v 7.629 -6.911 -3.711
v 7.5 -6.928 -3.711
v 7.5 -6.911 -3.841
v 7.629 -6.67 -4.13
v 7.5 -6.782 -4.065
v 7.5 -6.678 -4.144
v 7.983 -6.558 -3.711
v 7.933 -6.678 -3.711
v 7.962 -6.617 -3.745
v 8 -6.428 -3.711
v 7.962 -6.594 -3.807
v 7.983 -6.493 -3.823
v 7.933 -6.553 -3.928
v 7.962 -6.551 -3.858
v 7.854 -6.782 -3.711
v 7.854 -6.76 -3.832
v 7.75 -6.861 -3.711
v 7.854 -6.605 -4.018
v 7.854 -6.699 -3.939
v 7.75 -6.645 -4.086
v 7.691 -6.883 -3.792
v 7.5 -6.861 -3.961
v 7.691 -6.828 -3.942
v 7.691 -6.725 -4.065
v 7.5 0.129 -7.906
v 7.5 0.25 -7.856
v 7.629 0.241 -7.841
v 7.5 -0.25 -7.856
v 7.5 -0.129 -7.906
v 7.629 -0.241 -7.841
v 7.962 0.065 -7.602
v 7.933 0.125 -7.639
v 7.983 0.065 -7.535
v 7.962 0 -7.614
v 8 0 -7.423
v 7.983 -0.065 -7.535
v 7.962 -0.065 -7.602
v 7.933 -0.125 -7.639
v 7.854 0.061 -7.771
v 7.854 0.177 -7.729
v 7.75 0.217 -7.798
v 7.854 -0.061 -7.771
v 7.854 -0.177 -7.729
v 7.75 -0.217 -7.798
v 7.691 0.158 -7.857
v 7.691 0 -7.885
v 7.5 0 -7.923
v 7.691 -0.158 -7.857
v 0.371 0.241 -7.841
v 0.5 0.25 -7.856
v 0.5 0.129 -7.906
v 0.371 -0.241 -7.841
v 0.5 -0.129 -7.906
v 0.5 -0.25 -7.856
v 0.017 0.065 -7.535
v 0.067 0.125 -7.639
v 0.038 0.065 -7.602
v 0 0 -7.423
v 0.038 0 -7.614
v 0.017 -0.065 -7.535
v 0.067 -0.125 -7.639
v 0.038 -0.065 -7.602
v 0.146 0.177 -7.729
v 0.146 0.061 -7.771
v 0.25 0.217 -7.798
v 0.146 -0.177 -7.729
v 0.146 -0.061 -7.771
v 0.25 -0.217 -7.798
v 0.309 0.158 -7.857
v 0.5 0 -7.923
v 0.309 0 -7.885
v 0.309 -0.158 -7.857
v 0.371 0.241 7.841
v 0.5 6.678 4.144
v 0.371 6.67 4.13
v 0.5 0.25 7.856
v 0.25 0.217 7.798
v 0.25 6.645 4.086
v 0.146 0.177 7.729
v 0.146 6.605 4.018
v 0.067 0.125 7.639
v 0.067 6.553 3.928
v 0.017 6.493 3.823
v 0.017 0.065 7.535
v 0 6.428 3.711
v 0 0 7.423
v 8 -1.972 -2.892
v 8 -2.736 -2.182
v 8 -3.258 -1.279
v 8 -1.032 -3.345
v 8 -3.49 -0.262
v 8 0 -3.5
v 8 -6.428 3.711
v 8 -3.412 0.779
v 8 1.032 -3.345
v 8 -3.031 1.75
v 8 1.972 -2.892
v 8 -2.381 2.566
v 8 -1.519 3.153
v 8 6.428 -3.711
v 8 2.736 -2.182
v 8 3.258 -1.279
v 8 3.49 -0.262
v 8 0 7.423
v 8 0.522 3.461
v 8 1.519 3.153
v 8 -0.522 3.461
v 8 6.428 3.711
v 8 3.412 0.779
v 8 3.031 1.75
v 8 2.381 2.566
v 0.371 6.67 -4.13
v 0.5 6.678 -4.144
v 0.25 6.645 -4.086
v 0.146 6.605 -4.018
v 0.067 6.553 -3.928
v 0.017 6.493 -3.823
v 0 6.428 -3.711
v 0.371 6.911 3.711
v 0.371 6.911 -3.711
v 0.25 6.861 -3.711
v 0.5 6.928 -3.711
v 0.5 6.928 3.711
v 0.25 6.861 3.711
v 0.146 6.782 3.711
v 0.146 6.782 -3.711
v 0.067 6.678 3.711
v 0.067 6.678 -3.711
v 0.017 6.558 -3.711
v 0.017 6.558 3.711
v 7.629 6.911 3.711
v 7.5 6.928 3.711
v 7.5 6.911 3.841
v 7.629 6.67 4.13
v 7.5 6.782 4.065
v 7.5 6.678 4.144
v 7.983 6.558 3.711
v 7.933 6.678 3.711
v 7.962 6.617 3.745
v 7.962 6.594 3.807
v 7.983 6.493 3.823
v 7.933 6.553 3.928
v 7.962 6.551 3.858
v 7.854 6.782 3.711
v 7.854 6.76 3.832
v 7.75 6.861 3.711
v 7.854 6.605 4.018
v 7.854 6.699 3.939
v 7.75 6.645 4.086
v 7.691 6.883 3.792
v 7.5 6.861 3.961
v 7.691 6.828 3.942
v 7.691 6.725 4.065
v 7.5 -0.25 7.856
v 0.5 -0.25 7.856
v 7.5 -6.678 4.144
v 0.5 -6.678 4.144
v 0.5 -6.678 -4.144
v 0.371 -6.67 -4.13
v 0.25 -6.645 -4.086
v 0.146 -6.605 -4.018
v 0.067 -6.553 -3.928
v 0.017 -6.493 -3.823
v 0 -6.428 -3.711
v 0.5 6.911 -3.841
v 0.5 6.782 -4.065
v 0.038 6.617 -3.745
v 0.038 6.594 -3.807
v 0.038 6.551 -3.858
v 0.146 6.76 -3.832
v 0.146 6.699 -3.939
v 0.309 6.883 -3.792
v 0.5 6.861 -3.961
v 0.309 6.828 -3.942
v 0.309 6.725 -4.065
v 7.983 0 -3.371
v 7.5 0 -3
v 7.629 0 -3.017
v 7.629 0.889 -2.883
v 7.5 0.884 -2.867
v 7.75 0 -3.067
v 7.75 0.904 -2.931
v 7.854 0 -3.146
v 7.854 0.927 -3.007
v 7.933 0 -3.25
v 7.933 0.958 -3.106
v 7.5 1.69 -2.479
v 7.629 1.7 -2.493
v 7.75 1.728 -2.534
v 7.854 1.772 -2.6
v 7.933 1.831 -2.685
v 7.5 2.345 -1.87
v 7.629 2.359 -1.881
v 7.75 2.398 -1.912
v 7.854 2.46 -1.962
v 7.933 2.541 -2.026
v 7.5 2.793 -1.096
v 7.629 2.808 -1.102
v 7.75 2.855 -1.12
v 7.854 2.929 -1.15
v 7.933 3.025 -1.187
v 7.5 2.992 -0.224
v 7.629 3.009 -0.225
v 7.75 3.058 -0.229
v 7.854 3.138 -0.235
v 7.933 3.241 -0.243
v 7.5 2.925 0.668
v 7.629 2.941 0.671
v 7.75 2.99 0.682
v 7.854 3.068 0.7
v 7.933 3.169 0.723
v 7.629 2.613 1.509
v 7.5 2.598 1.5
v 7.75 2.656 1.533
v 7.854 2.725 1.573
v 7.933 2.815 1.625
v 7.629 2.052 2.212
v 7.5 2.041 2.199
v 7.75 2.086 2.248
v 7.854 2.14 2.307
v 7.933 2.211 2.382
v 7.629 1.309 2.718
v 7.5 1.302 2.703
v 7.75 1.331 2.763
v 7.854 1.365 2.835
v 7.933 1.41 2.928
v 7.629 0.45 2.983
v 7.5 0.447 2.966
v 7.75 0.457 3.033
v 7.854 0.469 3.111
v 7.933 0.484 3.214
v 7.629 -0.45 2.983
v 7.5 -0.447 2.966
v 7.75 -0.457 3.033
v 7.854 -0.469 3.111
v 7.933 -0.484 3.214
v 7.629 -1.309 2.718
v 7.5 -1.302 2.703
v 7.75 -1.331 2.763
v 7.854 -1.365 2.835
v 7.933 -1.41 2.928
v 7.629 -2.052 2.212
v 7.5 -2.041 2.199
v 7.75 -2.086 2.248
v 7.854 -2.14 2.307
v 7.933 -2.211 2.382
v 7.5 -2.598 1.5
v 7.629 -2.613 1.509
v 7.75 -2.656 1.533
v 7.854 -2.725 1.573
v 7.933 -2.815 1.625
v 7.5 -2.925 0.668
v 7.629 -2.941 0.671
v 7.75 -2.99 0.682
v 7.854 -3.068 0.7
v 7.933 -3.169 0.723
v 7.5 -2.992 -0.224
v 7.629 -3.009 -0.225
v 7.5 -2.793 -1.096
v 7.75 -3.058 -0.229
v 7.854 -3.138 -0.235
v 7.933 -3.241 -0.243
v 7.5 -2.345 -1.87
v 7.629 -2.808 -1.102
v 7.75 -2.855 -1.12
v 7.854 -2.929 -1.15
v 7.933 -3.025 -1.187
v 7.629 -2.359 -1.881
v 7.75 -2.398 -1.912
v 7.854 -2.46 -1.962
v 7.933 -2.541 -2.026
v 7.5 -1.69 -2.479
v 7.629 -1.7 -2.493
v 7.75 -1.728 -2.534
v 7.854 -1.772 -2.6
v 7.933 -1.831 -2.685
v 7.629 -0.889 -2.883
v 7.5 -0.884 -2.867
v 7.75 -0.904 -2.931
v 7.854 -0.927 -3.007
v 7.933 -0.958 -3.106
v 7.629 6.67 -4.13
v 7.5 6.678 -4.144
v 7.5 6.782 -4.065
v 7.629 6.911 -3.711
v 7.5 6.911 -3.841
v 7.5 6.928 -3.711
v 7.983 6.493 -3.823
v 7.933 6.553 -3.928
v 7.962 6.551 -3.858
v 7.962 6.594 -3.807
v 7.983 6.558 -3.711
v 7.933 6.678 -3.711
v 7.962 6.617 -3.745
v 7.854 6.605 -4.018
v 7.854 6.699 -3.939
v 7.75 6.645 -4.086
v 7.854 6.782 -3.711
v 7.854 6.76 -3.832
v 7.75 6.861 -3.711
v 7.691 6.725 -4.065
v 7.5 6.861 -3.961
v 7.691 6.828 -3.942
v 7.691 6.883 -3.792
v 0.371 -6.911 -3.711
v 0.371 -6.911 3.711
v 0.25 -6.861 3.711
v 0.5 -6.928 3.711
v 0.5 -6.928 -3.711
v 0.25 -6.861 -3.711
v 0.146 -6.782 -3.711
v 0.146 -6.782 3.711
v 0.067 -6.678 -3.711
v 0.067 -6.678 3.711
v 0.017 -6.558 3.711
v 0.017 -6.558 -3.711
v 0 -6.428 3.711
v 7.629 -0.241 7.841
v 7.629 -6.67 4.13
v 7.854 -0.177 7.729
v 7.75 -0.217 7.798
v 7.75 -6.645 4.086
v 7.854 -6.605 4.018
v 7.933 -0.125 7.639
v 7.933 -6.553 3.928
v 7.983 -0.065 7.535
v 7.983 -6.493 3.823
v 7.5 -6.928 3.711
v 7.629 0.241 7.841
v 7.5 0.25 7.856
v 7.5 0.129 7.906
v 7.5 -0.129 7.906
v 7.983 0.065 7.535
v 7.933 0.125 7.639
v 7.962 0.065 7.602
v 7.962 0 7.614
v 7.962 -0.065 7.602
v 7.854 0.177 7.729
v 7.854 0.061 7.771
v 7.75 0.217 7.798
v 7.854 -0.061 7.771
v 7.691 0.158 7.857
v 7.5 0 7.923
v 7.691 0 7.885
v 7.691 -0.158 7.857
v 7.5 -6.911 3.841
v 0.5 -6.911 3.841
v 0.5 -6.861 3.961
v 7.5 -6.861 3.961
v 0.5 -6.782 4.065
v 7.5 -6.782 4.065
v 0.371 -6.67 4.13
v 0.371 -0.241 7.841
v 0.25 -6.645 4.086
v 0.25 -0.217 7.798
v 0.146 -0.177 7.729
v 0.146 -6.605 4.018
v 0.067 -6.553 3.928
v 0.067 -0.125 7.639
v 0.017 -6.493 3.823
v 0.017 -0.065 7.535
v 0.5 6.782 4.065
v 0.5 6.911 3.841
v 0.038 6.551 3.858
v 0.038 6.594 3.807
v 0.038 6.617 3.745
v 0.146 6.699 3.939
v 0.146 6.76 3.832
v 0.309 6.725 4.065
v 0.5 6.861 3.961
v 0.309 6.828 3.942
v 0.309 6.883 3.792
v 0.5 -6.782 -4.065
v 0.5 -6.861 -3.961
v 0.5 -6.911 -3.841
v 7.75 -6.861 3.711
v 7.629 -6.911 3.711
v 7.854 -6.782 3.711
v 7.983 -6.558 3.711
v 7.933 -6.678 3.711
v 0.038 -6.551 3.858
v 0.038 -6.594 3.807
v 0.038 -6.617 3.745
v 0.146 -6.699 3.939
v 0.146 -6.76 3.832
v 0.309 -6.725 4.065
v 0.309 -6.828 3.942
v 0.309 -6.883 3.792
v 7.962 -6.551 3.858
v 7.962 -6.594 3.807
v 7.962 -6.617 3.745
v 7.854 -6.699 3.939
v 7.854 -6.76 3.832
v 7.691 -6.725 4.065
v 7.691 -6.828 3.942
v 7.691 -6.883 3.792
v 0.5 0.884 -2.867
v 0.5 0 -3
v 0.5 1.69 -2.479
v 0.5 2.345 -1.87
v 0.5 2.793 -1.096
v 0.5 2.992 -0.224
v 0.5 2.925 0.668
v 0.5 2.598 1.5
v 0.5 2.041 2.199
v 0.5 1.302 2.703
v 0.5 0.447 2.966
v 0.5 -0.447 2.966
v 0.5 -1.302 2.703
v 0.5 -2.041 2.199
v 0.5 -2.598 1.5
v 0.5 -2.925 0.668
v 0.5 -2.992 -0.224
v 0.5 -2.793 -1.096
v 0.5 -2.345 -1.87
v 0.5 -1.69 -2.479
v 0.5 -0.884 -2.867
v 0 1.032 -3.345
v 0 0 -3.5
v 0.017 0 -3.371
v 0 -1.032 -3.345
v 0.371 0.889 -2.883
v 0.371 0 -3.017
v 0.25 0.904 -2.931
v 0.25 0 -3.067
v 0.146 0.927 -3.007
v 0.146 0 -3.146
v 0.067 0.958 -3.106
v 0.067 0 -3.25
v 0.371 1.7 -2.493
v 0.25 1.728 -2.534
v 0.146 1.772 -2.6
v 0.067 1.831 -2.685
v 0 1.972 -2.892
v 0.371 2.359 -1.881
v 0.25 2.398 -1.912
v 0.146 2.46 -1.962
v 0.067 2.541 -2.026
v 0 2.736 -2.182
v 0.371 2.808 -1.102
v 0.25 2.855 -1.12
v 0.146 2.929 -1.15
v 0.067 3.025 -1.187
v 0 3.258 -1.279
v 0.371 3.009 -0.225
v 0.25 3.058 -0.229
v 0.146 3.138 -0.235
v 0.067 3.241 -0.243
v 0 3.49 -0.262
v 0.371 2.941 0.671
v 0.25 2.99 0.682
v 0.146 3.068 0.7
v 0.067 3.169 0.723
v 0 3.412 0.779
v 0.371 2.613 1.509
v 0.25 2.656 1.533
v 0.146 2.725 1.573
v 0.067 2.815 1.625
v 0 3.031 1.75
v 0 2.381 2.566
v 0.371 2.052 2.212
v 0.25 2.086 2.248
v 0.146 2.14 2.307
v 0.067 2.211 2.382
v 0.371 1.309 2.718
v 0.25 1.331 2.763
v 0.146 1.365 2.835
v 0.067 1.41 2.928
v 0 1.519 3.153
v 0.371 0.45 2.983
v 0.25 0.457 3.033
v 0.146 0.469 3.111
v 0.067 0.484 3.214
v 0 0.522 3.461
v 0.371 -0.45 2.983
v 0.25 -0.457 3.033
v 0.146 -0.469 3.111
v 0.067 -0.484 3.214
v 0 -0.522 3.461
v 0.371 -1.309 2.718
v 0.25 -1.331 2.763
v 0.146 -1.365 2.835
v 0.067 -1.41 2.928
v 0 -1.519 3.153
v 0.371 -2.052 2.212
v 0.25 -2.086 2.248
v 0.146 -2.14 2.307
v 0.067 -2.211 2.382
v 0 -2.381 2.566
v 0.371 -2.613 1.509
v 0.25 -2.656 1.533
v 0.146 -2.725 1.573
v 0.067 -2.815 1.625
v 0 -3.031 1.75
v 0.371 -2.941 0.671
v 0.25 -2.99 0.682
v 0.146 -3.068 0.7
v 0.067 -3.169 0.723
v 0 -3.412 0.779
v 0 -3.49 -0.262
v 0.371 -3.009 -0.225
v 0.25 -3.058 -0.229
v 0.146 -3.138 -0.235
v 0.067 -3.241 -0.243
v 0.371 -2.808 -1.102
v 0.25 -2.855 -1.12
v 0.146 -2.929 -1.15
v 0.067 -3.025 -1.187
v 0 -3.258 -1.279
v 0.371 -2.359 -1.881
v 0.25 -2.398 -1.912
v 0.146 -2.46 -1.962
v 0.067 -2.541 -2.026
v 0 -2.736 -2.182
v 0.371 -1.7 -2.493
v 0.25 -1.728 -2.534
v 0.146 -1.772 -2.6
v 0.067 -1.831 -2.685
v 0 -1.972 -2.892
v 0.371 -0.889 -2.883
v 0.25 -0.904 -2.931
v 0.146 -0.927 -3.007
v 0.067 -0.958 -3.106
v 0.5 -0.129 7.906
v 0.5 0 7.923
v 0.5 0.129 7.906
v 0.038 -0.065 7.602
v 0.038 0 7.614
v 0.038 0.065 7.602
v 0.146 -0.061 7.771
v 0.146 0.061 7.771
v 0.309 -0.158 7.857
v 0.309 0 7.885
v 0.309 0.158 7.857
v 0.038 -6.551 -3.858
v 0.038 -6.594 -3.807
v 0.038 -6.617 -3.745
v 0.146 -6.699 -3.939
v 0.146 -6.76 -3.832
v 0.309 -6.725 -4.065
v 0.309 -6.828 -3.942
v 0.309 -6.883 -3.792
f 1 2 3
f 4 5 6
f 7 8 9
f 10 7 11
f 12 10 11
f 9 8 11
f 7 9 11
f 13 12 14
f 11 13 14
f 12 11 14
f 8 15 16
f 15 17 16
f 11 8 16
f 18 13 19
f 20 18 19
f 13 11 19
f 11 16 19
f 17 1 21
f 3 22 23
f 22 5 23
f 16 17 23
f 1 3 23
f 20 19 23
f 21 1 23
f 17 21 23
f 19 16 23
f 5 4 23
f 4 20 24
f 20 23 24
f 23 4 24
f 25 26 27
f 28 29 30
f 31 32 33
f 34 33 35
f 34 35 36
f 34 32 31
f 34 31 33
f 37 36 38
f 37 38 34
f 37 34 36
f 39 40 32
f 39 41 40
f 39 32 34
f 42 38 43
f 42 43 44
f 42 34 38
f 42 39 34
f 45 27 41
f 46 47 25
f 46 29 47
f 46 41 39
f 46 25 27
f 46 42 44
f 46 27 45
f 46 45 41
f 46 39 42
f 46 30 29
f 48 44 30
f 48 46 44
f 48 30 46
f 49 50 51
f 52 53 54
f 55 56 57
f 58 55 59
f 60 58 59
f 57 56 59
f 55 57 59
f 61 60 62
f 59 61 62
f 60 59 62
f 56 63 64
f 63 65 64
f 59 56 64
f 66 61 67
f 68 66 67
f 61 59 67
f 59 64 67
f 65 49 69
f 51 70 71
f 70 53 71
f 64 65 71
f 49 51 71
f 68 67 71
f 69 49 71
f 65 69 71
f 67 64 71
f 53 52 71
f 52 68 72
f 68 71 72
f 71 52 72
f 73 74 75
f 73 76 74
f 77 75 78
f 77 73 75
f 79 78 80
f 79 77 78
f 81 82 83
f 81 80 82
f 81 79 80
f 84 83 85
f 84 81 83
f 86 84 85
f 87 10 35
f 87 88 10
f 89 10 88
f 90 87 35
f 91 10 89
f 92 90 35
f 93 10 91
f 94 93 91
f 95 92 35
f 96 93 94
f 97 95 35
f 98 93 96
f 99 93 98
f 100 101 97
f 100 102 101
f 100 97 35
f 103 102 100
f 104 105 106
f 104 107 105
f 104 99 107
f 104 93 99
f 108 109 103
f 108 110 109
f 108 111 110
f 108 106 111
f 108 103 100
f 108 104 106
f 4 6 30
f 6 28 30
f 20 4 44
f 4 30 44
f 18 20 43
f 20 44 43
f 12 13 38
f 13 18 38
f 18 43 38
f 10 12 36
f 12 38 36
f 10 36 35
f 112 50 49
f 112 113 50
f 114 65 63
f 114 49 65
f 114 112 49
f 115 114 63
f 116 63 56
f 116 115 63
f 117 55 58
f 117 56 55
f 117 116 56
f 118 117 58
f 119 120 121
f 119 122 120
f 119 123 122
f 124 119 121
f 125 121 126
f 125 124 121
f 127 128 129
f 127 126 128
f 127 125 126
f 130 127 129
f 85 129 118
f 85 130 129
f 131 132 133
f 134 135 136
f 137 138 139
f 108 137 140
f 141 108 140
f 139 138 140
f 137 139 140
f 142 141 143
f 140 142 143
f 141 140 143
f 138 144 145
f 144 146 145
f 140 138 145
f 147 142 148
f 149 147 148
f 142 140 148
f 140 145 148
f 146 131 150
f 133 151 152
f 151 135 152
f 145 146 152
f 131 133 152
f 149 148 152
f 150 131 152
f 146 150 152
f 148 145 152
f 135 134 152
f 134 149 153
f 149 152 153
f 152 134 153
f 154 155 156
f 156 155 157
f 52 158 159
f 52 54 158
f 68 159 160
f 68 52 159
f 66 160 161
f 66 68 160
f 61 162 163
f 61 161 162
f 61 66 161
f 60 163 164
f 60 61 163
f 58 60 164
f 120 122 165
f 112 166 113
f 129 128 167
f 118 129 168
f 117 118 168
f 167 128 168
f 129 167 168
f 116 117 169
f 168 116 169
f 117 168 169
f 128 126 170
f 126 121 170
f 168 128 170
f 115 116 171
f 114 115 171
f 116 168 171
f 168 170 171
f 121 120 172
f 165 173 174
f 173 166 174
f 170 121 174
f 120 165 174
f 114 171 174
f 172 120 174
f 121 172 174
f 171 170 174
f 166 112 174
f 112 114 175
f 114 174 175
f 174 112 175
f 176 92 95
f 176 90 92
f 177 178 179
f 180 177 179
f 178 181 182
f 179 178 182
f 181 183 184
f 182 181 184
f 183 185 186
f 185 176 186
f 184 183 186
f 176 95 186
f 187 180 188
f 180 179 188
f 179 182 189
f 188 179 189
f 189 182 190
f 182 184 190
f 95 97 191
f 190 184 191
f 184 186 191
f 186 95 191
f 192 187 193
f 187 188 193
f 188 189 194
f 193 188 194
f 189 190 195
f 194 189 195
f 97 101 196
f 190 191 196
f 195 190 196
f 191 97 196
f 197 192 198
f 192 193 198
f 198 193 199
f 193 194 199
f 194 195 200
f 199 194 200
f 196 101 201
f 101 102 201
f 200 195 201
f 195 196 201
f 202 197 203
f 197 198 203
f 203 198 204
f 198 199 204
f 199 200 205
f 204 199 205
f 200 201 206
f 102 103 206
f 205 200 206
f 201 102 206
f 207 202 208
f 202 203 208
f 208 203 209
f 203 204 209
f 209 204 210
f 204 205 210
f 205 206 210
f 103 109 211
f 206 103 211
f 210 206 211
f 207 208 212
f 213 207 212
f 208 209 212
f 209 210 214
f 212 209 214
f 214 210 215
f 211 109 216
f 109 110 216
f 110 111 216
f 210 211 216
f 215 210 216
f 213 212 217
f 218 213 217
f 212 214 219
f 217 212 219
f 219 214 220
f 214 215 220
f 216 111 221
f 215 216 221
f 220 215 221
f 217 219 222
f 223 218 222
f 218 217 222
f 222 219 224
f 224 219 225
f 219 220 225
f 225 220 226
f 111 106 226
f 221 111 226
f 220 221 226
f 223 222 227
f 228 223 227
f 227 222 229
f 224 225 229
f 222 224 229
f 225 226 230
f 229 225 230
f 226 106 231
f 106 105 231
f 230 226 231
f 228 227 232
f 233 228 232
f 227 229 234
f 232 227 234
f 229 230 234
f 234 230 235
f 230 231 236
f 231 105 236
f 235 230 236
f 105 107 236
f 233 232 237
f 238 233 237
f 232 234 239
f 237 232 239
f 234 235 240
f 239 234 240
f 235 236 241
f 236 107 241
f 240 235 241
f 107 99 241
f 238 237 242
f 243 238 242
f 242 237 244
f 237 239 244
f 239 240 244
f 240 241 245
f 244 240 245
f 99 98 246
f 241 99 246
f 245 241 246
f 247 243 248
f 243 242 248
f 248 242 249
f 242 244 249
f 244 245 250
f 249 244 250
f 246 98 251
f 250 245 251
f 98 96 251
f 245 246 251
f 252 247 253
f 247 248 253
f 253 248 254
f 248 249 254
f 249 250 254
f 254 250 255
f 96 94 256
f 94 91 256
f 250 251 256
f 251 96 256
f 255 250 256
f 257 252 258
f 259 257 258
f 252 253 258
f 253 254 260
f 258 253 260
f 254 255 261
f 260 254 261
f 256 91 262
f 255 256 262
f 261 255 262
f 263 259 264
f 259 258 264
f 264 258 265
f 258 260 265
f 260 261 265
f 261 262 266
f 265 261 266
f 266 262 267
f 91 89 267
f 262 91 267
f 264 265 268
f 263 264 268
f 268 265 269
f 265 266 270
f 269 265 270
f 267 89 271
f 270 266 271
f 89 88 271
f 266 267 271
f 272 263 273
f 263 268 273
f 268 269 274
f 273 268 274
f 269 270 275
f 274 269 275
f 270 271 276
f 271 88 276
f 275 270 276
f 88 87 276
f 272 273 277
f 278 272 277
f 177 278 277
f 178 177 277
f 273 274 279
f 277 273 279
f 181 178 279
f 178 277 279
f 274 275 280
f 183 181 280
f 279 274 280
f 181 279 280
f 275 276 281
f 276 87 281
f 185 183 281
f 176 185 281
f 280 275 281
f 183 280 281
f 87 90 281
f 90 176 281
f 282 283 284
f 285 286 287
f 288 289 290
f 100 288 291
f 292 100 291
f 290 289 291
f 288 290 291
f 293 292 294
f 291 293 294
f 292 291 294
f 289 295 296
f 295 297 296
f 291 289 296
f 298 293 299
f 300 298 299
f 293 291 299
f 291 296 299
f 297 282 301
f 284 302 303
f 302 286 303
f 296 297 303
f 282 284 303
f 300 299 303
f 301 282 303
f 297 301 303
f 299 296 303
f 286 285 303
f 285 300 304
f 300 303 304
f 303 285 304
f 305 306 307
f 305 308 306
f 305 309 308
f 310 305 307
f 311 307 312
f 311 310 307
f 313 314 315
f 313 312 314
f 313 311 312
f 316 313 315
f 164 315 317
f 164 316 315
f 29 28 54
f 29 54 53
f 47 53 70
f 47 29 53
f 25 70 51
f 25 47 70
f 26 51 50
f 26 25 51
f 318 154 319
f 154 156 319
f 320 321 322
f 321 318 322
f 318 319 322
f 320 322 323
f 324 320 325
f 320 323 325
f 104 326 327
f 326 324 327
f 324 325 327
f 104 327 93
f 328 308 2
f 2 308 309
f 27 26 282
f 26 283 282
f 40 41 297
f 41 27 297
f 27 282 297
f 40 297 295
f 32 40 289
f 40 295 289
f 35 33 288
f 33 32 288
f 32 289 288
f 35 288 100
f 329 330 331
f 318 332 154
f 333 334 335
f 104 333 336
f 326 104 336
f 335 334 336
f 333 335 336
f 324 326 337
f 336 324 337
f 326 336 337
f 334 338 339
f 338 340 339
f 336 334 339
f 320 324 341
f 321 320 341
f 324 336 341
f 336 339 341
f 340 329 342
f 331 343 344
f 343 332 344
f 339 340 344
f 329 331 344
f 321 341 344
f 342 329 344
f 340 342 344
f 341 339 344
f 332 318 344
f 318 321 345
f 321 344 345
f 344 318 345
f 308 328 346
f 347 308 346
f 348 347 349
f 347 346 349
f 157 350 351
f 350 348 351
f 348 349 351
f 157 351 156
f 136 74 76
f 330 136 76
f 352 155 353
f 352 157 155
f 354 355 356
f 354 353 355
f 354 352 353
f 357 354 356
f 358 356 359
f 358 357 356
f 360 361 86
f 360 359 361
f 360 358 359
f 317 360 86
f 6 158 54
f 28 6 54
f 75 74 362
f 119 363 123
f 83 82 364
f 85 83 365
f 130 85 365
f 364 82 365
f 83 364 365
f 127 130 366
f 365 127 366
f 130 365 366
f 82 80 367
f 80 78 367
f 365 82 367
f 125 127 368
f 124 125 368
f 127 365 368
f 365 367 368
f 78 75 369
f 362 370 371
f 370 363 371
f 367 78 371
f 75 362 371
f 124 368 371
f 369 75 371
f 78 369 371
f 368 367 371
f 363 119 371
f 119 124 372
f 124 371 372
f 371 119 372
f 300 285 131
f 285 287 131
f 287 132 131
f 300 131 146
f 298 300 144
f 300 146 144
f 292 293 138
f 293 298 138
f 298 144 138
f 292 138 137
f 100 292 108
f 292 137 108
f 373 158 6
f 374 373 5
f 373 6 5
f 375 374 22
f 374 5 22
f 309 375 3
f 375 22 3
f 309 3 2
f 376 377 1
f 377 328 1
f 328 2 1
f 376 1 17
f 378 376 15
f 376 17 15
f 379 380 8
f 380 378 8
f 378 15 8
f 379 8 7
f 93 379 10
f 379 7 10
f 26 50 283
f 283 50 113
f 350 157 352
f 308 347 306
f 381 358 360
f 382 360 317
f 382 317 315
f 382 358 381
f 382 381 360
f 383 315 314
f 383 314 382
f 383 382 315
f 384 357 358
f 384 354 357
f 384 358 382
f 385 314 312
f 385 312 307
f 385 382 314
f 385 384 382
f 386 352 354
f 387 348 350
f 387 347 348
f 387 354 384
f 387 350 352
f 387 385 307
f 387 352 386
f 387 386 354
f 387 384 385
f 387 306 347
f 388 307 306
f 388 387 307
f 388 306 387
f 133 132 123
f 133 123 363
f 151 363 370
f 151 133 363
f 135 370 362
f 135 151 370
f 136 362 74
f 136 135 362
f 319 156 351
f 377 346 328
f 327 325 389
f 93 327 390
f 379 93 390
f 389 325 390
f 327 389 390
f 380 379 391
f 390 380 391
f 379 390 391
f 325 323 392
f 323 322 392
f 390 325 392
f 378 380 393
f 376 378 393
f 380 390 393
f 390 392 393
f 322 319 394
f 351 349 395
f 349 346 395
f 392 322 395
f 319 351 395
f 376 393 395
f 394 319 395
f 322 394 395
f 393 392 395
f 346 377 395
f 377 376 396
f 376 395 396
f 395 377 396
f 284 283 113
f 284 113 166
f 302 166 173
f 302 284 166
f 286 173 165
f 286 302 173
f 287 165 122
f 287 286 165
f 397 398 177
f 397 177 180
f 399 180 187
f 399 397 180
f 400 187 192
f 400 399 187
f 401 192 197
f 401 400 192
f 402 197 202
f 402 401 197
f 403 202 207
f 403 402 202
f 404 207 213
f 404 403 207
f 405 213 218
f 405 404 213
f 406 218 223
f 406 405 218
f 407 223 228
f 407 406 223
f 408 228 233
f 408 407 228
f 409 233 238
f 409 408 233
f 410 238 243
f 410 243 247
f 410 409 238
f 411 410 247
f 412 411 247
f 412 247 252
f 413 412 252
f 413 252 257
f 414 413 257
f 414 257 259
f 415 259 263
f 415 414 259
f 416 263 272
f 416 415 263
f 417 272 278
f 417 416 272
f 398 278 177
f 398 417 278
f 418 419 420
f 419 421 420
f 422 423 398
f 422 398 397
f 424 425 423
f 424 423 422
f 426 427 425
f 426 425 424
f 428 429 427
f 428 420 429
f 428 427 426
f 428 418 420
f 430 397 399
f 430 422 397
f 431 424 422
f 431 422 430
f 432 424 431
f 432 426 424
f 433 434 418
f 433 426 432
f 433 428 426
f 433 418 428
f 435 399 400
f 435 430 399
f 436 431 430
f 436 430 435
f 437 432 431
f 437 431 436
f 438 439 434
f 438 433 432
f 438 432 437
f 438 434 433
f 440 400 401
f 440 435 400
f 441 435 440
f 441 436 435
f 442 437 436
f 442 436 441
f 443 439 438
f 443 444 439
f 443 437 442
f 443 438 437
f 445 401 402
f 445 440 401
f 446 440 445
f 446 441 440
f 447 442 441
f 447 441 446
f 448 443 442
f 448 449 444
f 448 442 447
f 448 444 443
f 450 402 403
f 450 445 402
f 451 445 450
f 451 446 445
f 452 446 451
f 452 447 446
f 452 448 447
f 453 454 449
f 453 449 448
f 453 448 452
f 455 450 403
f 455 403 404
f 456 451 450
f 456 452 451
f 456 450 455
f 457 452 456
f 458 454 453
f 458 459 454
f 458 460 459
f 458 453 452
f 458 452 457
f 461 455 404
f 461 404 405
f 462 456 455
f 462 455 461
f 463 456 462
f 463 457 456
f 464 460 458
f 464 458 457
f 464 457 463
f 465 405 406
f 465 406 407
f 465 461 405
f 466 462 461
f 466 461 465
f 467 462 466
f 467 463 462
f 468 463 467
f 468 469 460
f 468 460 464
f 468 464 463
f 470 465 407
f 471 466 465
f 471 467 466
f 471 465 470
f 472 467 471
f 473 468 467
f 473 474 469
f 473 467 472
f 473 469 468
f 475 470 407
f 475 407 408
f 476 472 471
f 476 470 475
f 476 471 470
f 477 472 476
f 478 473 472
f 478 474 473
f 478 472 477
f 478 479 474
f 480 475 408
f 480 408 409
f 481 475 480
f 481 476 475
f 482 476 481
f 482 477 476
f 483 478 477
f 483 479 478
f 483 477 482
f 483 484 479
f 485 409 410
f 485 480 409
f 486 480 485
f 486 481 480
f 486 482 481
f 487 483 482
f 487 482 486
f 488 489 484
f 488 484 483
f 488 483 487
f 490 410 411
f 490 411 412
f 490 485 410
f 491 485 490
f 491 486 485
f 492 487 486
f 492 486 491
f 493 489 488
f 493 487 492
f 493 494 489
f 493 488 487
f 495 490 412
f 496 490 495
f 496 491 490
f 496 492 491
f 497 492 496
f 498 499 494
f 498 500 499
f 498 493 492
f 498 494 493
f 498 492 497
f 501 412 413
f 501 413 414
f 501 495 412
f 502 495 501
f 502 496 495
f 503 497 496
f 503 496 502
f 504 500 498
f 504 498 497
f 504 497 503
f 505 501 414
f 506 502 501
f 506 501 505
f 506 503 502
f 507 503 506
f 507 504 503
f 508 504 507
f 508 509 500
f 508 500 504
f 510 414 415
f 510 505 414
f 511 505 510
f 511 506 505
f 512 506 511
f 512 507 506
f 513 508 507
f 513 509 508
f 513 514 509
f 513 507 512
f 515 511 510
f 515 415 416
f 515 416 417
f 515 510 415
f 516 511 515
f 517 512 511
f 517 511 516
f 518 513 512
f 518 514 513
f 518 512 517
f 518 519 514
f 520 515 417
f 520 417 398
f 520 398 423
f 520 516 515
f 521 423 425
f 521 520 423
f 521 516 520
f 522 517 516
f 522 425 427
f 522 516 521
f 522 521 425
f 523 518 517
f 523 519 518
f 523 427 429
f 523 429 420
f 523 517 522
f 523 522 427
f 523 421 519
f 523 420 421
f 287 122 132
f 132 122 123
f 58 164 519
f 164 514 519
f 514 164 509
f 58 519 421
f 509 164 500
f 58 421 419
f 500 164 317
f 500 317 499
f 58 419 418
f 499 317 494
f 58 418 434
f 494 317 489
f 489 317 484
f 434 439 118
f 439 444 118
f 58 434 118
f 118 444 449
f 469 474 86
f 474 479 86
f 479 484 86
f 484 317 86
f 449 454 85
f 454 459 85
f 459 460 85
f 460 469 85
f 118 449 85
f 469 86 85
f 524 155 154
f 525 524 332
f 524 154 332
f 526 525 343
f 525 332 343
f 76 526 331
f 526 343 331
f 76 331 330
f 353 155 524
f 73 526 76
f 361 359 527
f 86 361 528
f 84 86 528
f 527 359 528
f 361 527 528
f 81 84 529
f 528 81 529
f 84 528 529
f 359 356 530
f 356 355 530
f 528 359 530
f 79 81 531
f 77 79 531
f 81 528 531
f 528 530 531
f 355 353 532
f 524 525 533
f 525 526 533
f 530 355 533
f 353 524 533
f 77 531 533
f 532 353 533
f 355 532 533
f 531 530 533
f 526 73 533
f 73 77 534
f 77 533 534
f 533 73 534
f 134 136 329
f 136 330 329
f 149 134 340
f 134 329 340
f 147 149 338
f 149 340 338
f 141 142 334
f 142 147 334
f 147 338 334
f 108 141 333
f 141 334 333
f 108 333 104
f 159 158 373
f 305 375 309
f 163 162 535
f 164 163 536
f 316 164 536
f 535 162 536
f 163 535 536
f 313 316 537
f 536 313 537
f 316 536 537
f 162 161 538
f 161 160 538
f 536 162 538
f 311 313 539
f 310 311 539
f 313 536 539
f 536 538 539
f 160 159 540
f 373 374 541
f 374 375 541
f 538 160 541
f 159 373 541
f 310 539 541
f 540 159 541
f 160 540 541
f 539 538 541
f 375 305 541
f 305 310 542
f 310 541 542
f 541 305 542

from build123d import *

# Parameters (mm, degrees)
SKETCH1_R           = 3
BOSS_EXTRUDE1_DEPTH = 8
FILLET1_R           = 0.5


with BuildPart() as part:
    # Sketch1 → Boss-Extrude1 (new body)
    with BuildSketch(Plane.YZ):
        Polygon((-6.92820323, -4), (0, -8), (6.92820323, -4), (6.92820323, 4), (0, 8), (-6.92820323, 4), align=None)
        Circle(SKETCH1_R, mode=Mode.SUBTRACT)
    extrude(amount=BOSS_EXTRUDE1_DEPTH)

    # Fillet1
    fillet1_edges = [part.edges().sort_by_distance(p)[0] for p in [
        (0, -3, 0),
        (8, -3, 0),
        (0, -6.92820323, 0),
        (0, -3.464101615, -6),
        (0, 3.464101615, -6),
        (0, 6.92820323, 0),
        (0, 3.464101615, 6),
        (0, -3.464101615, 6),
        (8, -6.92820323, 0),
        (8, -3.464101615, -6),
        (8, 3.464101615, -6),
        (8, 6.92820323, 0),
        (8, 3.464101615, 6),
        (8, -3.464101615, 6),
        (4, -6.92820323, 4),
        (4, 0, 8),
        (4, 6.92820323, -4),
        (4, 0, -8),
        (4, -6.92820323, -4),
        (4, 6.92820323, 4),
    ]]
    fillet(fillet1_edges, radius=FILLET1_R)


solid = part.part
